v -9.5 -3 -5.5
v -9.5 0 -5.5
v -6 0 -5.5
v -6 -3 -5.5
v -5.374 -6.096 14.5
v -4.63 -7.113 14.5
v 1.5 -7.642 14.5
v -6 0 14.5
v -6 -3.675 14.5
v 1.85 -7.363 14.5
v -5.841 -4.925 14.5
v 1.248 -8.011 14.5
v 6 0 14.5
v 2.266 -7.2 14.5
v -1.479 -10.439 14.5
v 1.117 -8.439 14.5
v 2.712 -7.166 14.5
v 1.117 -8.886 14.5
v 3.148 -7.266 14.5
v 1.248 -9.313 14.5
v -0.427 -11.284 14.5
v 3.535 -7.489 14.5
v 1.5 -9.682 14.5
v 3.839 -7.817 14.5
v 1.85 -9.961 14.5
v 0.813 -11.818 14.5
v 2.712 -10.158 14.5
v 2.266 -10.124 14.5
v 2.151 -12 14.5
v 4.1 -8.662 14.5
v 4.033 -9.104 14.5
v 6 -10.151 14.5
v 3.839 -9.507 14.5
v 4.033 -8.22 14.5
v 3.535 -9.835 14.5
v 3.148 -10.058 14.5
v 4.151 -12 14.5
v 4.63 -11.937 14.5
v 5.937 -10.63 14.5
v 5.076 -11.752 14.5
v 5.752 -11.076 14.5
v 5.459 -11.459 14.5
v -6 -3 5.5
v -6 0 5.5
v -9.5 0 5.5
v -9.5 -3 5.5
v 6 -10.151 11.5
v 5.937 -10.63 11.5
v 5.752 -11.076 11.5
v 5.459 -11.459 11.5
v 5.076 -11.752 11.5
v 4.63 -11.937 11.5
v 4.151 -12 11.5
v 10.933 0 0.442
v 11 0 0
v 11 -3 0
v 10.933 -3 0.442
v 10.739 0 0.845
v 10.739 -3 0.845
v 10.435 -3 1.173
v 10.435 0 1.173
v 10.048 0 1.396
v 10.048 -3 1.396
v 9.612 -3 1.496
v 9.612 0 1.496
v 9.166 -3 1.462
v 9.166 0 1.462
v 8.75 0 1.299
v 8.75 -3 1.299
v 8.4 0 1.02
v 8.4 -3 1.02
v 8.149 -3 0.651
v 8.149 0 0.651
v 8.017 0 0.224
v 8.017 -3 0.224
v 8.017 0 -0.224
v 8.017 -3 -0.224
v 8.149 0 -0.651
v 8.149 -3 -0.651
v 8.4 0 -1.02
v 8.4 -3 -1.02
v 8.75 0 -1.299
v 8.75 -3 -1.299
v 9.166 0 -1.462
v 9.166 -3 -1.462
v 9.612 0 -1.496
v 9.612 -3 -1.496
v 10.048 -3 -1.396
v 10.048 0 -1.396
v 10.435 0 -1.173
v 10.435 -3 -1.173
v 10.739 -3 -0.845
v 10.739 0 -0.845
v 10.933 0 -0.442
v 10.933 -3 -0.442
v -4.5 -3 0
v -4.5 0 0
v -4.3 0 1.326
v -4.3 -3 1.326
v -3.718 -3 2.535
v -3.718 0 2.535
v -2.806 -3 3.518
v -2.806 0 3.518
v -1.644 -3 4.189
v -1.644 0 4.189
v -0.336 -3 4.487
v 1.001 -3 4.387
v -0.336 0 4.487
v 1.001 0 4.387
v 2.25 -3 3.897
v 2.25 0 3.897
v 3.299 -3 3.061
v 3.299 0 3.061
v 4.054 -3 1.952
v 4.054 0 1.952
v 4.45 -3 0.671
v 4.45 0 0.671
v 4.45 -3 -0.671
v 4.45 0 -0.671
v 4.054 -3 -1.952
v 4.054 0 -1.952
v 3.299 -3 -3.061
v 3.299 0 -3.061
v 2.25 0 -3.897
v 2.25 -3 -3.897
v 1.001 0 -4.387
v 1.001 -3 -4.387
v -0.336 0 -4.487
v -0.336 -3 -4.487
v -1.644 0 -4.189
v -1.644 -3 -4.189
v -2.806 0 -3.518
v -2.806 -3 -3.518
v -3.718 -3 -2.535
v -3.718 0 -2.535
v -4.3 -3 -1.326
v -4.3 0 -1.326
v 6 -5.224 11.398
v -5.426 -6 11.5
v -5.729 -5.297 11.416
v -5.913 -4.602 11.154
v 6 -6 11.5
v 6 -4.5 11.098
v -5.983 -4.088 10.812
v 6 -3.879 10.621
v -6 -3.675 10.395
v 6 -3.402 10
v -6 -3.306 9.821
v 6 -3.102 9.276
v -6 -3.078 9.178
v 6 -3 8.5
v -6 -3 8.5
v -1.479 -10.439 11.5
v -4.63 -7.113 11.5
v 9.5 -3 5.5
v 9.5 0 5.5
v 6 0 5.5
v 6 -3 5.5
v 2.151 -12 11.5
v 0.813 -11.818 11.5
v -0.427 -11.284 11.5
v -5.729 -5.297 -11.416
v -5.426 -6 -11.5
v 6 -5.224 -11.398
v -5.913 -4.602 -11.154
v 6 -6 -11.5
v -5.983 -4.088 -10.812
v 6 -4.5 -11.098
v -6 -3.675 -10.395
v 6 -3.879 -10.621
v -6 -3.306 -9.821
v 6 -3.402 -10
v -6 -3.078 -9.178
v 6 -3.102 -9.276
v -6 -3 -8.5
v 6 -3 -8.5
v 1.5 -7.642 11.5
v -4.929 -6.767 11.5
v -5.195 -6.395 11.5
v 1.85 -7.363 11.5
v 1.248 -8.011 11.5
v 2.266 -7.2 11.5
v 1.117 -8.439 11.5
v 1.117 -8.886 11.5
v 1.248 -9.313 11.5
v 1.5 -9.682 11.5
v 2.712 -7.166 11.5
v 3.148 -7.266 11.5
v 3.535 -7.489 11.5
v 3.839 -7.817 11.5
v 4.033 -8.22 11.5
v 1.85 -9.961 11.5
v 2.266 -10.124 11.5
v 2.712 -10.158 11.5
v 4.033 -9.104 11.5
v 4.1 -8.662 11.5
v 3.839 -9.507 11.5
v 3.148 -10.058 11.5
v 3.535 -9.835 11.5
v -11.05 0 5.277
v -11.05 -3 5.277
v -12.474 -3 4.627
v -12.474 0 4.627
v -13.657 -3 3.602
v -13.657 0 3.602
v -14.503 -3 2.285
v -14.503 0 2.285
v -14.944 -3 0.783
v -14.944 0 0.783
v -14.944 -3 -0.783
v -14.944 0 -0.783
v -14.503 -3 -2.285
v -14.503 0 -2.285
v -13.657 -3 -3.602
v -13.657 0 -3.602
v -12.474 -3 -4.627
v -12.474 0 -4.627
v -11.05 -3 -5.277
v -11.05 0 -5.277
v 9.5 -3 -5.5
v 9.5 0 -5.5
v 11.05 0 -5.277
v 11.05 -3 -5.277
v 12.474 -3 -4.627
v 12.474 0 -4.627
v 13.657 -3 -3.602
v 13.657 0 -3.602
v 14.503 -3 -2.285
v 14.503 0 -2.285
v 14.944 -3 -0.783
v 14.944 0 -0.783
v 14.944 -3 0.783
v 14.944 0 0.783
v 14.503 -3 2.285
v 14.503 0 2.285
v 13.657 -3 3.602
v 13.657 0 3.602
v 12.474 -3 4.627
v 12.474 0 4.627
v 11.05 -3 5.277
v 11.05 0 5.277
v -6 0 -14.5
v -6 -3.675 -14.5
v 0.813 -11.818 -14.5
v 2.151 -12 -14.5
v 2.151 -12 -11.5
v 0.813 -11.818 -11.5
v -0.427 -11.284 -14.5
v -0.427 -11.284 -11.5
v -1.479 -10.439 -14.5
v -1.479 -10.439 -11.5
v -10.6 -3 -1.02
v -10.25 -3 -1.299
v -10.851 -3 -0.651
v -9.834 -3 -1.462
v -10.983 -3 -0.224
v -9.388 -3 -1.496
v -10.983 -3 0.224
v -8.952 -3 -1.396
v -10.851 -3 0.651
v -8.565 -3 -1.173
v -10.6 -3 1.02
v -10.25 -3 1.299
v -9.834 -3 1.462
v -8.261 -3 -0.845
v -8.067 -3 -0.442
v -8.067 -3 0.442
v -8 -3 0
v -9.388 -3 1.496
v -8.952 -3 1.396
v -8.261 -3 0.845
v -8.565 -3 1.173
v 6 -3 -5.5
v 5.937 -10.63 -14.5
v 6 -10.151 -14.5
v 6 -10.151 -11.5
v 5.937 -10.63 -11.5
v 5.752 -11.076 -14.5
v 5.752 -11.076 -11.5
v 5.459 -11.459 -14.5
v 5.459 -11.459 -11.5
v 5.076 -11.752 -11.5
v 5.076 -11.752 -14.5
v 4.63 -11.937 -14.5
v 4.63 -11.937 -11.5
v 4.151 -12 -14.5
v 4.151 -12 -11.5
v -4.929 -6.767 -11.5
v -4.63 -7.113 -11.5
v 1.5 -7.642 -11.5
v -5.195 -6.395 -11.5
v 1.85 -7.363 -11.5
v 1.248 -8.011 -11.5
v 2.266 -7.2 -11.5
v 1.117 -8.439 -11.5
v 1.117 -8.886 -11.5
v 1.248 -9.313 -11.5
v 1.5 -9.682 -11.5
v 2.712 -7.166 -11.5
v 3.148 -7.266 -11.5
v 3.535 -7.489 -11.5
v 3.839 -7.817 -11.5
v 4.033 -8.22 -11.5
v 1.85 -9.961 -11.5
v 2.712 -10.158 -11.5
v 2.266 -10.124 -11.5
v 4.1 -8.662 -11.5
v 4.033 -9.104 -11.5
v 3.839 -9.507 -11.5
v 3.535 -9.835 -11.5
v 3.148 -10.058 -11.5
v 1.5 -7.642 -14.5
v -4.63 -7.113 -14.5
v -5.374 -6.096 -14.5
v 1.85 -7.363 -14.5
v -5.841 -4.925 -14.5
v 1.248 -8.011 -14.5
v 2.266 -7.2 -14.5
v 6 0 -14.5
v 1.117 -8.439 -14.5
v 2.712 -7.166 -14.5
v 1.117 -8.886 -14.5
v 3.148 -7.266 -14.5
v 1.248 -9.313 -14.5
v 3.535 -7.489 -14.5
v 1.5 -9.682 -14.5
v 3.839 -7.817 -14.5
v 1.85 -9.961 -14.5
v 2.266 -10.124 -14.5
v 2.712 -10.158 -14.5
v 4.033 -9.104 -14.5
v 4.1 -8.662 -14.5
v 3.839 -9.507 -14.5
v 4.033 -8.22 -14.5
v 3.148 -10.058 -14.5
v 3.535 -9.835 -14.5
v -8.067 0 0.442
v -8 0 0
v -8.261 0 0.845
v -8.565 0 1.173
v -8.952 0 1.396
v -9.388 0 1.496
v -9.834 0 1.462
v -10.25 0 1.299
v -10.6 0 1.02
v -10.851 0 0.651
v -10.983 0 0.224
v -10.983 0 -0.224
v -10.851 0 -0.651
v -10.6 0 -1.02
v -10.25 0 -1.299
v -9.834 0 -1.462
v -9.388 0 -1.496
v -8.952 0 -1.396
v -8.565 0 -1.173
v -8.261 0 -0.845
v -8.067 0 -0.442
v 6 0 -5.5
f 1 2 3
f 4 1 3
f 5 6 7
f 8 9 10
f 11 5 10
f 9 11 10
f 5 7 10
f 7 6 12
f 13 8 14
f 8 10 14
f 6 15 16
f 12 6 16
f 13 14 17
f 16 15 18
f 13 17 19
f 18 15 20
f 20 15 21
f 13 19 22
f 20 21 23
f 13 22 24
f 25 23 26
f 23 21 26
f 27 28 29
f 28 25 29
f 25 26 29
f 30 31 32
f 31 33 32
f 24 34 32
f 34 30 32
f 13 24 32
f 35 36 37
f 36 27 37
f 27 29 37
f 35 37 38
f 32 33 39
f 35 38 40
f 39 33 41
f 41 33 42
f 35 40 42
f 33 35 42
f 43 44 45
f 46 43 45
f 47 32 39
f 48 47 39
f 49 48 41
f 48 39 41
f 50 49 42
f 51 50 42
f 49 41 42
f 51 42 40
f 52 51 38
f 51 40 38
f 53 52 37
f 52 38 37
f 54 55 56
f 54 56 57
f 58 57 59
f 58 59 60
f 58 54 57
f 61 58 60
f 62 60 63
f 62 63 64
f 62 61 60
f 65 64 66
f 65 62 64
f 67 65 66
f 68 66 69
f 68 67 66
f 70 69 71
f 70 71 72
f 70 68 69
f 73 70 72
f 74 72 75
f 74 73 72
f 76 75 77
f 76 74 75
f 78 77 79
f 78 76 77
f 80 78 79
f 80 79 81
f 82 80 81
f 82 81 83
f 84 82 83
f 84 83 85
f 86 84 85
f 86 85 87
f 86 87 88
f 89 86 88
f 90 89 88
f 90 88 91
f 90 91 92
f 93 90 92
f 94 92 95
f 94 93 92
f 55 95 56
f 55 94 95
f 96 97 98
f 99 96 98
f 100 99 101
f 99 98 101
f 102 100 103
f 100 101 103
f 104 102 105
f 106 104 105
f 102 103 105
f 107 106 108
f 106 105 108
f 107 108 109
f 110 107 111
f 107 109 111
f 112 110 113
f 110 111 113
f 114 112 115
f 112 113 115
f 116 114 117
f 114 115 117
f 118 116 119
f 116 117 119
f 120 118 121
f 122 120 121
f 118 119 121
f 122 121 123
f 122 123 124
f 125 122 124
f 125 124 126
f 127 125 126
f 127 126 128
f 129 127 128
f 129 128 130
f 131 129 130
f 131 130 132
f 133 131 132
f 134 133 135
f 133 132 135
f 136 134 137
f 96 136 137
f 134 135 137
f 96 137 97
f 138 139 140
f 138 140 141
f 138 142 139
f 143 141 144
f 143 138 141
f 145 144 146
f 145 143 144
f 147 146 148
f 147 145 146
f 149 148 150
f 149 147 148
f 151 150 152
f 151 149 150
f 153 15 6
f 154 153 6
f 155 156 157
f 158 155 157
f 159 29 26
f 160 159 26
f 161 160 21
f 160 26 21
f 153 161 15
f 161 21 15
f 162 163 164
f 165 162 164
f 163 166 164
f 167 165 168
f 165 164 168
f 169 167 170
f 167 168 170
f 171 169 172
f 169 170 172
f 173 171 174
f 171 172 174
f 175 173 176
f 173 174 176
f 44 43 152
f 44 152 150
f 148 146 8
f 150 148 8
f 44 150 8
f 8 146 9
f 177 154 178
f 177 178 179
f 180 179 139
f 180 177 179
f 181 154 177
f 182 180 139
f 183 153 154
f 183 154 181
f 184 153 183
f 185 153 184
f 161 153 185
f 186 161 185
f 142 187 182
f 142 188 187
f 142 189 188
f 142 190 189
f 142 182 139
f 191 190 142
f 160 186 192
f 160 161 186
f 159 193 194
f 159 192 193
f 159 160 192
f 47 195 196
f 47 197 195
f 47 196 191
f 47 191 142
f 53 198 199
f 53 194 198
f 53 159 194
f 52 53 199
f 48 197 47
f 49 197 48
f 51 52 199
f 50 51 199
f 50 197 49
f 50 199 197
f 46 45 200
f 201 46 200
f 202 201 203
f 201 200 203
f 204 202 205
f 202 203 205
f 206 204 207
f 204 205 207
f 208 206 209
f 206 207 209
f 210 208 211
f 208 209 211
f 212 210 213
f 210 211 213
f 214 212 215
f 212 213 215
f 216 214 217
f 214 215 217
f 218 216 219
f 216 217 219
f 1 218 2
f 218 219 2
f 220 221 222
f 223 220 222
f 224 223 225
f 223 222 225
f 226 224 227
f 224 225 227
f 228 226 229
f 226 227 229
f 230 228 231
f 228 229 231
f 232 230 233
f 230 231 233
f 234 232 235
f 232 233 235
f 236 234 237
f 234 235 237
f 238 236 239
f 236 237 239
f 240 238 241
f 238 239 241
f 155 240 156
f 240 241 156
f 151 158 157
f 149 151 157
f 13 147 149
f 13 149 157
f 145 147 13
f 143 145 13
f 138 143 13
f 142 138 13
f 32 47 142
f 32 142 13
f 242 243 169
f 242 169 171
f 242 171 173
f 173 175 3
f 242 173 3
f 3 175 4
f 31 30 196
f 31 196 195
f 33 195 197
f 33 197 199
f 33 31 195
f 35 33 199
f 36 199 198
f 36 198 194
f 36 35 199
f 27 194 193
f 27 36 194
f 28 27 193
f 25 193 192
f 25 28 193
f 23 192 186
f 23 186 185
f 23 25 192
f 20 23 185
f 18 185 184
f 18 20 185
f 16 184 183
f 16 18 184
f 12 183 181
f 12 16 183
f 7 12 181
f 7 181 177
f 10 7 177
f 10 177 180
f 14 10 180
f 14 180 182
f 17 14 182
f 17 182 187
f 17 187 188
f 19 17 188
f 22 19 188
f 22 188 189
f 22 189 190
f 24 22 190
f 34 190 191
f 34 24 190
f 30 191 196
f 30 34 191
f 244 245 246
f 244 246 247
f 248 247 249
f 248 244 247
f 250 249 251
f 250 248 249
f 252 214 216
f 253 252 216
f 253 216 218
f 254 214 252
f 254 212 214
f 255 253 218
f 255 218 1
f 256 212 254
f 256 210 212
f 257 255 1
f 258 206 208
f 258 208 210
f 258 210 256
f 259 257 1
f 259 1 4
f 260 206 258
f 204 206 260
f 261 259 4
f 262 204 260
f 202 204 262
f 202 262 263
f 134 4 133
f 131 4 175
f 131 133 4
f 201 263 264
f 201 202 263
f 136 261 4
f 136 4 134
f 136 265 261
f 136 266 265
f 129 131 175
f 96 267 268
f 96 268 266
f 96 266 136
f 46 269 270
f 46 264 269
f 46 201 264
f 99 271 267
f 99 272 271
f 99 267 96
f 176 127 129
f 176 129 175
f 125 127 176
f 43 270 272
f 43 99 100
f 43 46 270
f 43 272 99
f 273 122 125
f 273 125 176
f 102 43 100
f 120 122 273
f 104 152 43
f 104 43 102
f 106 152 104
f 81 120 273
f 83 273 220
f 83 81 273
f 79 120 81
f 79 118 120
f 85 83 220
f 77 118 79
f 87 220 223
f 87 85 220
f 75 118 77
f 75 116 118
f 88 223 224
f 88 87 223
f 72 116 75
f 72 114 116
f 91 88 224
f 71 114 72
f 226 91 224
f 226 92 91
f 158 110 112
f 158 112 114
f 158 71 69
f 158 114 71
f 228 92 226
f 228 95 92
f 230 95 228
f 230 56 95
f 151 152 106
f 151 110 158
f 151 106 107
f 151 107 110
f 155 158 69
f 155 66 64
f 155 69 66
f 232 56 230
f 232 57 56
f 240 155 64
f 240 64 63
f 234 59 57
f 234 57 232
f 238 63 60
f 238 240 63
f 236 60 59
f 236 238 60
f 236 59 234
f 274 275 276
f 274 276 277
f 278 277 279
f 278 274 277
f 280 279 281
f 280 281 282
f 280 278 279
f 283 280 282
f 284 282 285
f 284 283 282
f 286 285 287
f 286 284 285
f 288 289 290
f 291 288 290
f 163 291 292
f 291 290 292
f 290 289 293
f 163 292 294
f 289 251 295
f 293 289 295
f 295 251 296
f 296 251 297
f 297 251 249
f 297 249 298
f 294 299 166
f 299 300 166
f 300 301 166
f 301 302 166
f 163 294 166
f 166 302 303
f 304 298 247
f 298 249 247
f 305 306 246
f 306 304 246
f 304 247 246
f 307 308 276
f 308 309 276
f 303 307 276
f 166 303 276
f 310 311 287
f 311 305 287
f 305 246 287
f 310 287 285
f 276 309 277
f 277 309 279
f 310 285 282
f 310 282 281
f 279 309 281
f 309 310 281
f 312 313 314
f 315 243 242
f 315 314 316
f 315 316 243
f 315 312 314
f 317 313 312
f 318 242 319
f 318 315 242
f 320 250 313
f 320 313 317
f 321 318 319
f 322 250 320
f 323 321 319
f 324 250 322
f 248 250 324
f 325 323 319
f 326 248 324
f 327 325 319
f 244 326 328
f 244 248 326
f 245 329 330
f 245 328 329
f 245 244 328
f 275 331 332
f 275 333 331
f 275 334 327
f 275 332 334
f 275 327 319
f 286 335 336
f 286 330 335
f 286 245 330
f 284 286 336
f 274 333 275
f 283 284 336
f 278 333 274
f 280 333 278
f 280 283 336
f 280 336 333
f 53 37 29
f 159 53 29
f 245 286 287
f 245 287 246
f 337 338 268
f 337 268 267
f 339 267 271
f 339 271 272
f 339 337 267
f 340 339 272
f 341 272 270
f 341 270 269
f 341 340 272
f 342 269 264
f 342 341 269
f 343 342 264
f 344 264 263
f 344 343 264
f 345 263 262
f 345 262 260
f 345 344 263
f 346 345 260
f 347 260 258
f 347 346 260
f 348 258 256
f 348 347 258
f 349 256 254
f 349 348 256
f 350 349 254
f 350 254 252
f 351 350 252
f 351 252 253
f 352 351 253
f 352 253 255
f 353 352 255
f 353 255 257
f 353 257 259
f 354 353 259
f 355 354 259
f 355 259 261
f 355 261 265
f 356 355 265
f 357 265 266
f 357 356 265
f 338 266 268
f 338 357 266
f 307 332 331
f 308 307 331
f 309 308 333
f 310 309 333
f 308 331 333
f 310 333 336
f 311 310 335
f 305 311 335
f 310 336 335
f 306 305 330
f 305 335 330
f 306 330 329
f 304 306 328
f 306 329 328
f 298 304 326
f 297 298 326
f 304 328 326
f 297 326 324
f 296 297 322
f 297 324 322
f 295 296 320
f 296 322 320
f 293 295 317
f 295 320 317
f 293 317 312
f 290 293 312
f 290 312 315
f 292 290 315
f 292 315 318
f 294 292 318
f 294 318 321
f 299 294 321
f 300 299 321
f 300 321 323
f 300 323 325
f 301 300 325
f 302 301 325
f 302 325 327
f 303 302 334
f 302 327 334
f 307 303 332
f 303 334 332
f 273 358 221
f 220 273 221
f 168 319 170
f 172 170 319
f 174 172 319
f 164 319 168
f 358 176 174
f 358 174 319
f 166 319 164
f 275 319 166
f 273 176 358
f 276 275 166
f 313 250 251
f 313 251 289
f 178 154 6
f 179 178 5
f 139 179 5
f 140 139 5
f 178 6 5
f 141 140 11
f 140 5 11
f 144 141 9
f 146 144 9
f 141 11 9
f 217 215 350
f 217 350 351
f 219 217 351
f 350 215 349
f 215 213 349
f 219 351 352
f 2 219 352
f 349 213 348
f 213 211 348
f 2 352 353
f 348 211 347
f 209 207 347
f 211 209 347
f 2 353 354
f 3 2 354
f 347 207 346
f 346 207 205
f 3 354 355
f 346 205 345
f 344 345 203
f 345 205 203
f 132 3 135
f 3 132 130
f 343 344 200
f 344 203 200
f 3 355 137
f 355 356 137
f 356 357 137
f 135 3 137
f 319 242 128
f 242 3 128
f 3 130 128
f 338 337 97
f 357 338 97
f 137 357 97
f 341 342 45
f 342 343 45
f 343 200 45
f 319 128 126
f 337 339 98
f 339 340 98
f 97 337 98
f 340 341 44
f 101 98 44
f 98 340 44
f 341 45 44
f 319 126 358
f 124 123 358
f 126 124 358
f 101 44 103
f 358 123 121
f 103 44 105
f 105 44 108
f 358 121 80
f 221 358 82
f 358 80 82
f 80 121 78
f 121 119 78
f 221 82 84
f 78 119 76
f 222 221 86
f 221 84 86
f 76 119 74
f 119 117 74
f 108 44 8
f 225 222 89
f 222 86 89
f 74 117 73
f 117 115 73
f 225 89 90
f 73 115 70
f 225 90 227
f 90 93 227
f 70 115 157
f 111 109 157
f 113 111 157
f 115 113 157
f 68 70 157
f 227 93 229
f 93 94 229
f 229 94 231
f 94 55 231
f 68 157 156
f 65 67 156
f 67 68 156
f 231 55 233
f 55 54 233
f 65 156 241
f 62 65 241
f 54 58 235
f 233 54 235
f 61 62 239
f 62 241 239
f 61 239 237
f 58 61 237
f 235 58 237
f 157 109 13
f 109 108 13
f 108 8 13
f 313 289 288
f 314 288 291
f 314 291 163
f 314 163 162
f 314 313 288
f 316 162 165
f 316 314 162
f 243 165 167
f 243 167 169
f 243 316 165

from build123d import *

# Parameters (mm, degrees)
F0_R     = 1.5
F0_R_2   = 4.5
F1_DEPTH = 3
F2_W     = 12
F2_H     = 29
F3_DEPTH = 3
F4_R     = 1.5
F5_DEPTH = 3
F7_R     = 3
F8_R     = 4.5
F9_DEPTH = 3


with BuildPart() as f1:
    # F0 (on Front) → F1 (new body)
    with BuildSketch(Plane.XZ):
        with BuildLine():
            Line((0, -5.5), (9.5, -5.5))
            ThreePointArc((9.5, -5.5), (15, 0), (9.5, 5.5))
            Line((9.5, 5.5), (0, 5.5))
            Line((0, 5.5), (-9.5, 5.5))
            ThreePointArc((-9.5, 5.5), (-15, 0), (-9.5, -5.5))
            Line((-9.5, -5.5), (0, -5.5))
        make_face()
        with Locations((-9.5, 0)):
            Circle(F0_R, mode=Mode.SUBTRACT)
        Circle(F0_R_2, mode=Mode.SUBTRACT)
        with Locations((9.5, 0)):
            Circle(F0_R, mode=Mode.SUBTRACT)
    extrude(amount=F1_DEPTH)

    # F2 (on face) → F3 (join)
    with BuildSketch(Plane.XZ.offset(3)):
        Rectangle(F2_W, F2_H)
    extrude(amount=-F3_DEPTH)

    # F4 (on face) → F5 (join)
    with BuildSketch(Plane(origin=(0, 0, -14.5), x_dir=(1, 0, 0), z_dir=(0, 0, -1))):
        with BuildLine():
            Line((-6, 0), (6, 0))
            Line((6, 0), (6, 10.1512318682))
            ThreePointArc((6, 10.1512318682), (5.458508351, 11.458508351), (4.1512318682, 12))
            Line((4.1512318682, 12), (2.1505740618, 12))
            ThreePointArc((2.1505740618, 12), (0.1749902584, 11.5931545408), (-1.4790906252, 10.4388274542))
            Line((-1.4790906252, 10.4388274542), (-4.629664687, 7.11341274))
            ThreePointArc((-4.629664687, 7.11341274), (-5.6447994271, 5.5254873044), (-6, 3.6745852858))
            Line((-6, 3.6745852858), (-6, 0))
        make_face()
        with Locations((2.5998784695, 8.662102744)):
            Circle(F4_R, mode=Mode.SUBTRACT)
    extrude(amount=-F5_DEPTH)

    # F6: F1 across plane


with BuildPart() as f1_1:
    add(f1.part)
    add(f1.part.mirror(Plane.XY))

    # F7
    f7_edges = [f1_1.edges().sort_by_distance(p)[0] for p in [
        (0, -3, 11.5),
        (0, -3, -11.5),
    ]]
    fillet(f7_edges, radius=F7_R)

    # F8 (on face) → F9 (cut, through all)
    with BuildSketch(Plane(origin=(0, 0, 0), x_dir=(-1, 0, 0), z_dir=(0, 1, 0))):
        Circle(F8_R)
    extrude(amount=-F9_DEPTH, mode=Mode.SUBTRACT)


solid = f1_1.part
